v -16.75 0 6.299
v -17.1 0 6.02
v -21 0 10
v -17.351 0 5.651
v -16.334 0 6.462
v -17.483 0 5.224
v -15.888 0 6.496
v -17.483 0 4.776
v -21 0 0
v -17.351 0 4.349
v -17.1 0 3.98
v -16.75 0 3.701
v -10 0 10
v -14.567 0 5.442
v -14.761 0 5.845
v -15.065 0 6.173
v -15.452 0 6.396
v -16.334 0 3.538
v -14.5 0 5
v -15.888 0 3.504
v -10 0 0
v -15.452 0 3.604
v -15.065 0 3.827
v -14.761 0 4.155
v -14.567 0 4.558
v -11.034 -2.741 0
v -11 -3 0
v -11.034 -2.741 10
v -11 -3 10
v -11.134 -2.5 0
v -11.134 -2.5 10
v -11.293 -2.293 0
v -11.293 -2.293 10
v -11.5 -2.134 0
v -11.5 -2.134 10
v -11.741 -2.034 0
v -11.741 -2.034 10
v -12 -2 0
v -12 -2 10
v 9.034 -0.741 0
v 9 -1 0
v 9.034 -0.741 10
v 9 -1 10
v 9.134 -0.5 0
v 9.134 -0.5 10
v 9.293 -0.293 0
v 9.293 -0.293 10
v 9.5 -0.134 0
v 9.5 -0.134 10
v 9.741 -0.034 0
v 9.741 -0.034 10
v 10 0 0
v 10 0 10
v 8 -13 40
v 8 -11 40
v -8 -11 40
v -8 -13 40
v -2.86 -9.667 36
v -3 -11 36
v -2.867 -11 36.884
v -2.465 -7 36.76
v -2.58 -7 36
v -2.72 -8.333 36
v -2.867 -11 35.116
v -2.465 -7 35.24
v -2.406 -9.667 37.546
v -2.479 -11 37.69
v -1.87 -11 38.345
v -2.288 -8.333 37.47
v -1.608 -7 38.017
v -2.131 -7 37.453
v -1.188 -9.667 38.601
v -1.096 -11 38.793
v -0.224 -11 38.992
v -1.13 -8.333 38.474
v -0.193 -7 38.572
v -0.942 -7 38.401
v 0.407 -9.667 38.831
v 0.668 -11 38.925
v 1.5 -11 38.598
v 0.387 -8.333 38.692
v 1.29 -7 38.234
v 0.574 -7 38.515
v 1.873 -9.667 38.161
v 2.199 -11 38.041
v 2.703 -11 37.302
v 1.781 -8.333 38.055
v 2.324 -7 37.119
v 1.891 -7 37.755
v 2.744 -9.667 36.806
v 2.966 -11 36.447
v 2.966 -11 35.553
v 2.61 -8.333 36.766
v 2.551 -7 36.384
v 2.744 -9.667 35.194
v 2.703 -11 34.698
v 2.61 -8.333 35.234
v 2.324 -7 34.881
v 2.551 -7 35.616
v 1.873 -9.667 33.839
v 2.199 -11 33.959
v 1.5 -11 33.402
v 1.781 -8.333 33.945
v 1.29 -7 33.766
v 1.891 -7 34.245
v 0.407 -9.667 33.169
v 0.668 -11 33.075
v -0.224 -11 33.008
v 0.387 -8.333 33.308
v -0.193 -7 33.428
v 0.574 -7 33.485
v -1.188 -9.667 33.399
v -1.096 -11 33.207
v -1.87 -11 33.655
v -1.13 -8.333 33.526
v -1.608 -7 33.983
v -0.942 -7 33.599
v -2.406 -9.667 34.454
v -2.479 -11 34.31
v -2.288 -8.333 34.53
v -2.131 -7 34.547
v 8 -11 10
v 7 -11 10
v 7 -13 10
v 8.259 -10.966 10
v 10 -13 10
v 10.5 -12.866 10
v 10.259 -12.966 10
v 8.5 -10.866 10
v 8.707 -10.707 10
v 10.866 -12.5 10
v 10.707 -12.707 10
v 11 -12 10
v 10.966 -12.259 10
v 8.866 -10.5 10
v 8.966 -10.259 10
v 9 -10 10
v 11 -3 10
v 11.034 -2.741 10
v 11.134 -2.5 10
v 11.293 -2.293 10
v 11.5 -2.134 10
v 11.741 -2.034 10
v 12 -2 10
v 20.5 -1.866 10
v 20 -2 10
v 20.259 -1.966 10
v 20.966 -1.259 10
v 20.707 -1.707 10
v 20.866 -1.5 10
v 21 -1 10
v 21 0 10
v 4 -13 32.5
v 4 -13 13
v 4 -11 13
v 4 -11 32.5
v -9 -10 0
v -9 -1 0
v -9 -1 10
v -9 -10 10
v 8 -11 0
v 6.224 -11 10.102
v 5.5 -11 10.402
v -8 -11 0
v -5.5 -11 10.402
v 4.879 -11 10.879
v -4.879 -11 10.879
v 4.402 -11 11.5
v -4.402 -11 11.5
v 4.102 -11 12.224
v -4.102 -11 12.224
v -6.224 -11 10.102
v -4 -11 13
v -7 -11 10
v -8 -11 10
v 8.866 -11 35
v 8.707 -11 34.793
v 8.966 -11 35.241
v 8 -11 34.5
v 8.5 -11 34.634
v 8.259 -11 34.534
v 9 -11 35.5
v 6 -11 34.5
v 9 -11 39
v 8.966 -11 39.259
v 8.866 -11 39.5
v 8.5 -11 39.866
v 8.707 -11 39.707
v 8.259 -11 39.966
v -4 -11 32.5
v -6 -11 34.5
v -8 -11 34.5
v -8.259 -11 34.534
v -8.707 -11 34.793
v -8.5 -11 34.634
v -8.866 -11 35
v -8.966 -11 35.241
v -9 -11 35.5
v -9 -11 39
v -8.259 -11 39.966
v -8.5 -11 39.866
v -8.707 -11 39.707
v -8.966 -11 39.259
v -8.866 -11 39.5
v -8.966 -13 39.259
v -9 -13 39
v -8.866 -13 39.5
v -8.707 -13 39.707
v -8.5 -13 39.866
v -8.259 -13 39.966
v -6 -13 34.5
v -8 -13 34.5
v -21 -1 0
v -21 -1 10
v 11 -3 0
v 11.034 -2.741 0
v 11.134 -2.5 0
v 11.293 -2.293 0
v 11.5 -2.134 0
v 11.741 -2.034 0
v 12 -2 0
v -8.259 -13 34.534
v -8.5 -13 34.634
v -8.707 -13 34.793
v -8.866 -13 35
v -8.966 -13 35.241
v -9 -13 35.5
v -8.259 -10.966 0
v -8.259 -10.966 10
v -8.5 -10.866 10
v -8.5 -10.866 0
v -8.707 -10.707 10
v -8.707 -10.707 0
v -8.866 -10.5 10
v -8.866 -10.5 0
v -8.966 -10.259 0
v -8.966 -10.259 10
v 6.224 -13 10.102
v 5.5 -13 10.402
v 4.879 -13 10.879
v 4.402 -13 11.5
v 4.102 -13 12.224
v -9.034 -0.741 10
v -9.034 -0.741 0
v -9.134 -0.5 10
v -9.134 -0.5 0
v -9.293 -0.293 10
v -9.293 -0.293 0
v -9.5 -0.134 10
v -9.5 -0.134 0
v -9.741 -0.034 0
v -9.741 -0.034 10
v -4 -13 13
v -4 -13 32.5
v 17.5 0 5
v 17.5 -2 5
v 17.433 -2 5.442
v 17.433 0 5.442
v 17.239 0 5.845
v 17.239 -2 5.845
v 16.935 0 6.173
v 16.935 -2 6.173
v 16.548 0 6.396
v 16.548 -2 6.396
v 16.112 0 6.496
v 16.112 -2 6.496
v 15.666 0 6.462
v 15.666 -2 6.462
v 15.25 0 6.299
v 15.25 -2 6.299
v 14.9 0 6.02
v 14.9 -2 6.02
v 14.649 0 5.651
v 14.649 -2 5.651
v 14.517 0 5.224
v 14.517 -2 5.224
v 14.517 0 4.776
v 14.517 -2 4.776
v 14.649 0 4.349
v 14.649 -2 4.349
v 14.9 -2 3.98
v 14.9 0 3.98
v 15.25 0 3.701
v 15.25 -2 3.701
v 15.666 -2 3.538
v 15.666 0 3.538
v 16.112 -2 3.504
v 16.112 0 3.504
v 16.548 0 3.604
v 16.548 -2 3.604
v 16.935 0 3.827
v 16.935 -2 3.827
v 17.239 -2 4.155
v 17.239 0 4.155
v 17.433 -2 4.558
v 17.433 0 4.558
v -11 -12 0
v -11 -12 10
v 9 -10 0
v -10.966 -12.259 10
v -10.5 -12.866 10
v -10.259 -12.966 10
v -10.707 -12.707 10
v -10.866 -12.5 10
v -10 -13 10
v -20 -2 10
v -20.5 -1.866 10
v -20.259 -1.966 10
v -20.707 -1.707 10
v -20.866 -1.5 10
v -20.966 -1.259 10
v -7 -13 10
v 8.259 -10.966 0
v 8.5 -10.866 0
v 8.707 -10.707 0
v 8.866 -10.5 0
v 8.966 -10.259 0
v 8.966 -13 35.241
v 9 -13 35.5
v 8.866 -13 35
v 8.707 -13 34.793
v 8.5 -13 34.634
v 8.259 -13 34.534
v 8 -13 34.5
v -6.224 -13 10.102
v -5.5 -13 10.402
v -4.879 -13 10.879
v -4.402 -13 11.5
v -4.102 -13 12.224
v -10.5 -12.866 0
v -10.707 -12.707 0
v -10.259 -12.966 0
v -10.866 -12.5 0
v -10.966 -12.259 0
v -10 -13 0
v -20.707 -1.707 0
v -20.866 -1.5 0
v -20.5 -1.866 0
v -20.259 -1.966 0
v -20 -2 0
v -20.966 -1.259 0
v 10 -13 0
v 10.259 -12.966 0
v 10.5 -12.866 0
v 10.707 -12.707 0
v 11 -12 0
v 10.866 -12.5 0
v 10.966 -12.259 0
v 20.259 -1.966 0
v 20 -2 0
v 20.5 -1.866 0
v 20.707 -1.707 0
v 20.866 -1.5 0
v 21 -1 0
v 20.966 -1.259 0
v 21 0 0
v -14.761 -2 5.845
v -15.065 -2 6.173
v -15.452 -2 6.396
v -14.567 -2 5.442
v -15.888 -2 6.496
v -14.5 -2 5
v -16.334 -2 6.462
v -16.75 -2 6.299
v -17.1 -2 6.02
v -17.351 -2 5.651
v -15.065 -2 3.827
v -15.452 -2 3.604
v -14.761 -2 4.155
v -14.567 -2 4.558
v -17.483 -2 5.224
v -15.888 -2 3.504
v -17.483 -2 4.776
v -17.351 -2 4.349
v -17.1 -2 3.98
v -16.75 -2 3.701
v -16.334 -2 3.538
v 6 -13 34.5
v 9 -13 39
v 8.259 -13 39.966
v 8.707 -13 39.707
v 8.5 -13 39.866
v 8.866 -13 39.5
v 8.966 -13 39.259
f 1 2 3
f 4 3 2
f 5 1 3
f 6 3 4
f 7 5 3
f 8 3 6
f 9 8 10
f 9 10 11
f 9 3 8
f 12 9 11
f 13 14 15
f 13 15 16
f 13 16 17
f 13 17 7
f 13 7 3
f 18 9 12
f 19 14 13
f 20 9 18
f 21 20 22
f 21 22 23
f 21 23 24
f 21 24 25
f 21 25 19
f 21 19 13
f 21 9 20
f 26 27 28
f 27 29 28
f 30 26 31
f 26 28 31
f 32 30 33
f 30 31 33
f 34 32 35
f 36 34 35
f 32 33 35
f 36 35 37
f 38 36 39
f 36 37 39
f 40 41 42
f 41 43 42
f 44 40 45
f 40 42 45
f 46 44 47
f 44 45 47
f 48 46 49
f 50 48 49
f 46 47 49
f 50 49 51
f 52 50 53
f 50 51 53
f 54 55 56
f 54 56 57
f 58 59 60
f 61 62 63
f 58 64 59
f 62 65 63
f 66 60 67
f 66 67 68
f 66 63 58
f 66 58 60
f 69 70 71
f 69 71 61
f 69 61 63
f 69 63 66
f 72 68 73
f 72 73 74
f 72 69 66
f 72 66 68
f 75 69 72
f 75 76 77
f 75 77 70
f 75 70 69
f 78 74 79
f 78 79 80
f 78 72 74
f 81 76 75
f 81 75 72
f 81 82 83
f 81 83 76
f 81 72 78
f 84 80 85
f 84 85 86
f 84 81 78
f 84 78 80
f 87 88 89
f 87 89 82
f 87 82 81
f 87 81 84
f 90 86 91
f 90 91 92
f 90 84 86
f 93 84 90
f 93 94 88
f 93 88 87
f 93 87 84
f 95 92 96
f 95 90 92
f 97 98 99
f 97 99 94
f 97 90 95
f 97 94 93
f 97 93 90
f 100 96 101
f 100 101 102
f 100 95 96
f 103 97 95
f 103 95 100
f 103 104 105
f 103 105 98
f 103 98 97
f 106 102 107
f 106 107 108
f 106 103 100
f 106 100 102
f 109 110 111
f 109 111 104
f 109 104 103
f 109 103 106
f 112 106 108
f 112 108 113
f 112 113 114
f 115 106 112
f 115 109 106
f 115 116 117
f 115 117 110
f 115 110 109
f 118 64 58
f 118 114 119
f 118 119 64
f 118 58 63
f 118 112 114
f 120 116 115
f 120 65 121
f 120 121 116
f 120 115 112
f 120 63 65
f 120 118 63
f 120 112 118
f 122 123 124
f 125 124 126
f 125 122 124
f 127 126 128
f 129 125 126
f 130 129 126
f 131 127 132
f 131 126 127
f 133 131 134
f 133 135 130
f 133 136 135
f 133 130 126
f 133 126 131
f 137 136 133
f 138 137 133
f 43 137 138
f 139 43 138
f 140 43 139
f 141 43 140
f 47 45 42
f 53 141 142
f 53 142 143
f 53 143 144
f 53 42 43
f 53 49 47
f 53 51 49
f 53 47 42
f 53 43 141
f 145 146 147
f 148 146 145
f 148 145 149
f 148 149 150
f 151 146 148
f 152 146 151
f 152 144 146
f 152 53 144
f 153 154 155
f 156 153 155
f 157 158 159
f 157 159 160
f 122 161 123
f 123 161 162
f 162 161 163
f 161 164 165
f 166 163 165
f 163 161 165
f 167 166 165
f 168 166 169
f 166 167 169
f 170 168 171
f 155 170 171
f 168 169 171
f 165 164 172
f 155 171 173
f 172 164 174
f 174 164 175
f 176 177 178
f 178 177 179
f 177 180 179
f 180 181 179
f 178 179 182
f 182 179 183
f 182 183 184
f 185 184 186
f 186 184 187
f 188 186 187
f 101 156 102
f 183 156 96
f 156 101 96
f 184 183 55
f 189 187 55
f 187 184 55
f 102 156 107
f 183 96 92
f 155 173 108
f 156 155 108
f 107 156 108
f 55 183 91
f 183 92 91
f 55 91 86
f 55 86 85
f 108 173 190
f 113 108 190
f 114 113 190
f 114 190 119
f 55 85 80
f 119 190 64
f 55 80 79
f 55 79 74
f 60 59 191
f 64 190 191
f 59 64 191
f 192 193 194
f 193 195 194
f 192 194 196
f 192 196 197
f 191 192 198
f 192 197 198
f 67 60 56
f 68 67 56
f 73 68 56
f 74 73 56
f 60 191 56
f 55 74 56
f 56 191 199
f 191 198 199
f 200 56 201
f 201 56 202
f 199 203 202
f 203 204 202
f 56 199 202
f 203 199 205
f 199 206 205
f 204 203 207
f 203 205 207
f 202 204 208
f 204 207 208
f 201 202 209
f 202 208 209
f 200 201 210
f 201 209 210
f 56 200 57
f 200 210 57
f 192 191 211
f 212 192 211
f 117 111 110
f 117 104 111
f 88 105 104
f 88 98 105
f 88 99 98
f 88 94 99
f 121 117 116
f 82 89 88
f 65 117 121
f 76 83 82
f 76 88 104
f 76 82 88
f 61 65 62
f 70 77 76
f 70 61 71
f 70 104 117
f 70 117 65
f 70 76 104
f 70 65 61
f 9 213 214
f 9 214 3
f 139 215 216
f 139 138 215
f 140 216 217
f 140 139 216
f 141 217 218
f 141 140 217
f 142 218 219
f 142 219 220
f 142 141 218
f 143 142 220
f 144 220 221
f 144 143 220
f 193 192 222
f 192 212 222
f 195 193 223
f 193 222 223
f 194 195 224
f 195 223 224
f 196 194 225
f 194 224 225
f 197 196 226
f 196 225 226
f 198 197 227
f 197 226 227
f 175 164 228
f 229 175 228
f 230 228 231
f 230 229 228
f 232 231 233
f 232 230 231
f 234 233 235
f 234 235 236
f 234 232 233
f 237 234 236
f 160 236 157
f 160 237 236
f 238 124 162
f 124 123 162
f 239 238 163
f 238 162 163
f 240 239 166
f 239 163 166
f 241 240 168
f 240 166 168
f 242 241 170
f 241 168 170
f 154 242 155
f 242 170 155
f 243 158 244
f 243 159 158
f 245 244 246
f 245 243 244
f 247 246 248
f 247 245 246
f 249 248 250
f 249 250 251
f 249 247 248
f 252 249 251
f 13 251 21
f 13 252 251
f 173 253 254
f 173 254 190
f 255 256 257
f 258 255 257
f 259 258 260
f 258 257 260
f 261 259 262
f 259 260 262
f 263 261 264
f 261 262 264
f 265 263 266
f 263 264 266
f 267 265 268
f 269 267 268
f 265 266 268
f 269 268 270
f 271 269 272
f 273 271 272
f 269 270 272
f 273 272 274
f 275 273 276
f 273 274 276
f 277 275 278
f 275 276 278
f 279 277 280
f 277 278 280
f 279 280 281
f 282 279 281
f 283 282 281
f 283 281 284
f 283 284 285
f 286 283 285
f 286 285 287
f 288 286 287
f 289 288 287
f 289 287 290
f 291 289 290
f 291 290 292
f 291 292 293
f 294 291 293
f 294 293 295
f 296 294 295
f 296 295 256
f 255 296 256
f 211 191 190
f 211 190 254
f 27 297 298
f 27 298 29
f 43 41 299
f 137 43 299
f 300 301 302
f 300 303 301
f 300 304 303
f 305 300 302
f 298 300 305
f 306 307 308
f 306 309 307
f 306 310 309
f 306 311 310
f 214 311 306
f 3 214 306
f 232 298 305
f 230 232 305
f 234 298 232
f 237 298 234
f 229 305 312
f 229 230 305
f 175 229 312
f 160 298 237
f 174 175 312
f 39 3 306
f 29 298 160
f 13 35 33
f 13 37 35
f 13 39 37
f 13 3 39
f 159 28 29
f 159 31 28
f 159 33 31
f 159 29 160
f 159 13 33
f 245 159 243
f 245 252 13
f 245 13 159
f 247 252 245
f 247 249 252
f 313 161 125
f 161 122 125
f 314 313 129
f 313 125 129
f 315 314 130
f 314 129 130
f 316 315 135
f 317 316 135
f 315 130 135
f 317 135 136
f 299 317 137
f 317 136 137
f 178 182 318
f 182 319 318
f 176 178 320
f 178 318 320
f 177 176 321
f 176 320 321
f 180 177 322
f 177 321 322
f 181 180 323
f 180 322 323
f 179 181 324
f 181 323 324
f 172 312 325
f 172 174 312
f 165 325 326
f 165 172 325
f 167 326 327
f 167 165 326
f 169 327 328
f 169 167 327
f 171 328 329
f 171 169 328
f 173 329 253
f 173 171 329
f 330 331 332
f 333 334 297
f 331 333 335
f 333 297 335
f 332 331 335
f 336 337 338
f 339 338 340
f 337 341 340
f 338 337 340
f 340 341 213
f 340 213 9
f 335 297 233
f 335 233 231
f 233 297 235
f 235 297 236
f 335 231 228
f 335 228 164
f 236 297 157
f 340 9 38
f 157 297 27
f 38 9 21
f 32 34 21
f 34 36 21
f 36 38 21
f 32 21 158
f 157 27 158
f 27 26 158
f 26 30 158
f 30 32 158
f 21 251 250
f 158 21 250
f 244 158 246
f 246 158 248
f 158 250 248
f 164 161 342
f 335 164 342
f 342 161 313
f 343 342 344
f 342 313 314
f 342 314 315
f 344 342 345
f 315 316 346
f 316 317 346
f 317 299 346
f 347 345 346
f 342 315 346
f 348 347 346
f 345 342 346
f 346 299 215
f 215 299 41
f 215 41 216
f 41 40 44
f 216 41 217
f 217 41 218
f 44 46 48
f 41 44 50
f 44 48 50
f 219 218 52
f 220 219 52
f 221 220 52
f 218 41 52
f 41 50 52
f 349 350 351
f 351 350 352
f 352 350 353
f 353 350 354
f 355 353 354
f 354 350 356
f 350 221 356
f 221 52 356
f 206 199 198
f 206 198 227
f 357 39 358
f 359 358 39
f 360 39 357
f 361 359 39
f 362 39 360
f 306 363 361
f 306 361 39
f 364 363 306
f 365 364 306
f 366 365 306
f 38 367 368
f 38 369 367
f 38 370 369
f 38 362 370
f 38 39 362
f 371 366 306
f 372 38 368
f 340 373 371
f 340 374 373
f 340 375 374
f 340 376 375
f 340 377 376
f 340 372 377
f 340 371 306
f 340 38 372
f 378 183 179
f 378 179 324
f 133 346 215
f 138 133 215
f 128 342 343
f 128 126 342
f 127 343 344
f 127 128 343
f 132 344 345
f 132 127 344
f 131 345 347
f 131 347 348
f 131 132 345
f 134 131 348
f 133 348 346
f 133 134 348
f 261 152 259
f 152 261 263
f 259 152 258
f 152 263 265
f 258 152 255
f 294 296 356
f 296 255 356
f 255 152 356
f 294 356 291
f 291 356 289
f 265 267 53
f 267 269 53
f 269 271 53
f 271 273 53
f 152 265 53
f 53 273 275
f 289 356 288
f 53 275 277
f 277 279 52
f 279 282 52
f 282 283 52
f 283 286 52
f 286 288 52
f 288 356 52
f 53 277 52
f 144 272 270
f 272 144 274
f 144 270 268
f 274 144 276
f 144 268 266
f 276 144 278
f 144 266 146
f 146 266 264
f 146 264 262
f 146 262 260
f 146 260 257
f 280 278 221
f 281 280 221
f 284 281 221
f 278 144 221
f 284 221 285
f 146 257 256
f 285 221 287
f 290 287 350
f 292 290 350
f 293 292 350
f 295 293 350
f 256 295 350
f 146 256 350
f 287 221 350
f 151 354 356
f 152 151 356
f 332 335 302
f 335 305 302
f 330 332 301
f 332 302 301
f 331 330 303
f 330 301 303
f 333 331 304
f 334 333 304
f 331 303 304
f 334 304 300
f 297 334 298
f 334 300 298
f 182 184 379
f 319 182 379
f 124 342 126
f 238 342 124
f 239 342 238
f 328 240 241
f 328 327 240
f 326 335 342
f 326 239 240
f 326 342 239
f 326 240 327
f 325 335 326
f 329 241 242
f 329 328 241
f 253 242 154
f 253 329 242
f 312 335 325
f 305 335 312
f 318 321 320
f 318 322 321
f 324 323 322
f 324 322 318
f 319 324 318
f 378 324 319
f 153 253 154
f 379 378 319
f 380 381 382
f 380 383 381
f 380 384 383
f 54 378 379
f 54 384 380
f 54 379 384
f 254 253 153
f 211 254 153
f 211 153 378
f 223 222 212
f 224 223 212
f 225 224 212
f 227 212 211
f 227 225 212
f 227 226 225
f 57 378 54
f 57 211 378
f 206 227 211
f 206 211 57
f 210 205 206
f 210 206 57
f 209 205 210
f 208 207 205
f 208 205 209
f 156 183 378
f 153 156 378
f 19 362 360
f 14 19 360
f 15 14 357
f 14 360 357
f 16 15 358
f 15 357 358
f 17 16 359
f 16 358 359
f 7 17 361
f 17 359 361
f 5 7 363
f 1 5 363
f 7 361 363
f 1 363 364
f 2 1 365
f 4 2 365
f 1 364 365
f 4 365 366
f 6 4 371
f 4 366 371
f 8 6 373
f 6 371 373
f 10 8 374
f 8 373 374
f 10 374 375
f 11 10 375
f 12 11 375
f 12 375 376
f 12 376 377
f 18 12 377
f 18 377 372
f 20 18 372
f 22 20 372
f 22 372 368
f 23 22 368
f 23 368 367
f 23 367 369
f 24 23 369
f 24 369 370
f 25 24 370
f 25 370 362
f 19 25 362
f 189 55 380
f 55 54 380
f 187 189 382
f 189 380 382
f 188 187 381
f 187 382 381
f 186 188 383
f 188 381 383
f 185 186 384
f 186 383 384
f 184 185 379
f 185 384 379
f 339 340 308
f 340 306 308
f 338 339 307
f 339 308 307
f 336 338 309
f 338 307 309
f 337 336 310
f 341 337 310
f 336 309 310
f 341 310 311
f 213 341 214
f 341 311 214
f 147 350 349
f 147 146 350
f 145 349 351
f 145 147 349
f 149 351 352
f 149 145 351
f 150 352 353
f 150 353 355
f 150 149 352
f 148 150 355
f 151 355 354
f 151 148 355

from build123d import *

# Parameters (mm, degrees)
PAD_DEPTH    = 10
SKETCH001_W  = 8
SKETCH001_H  = 2
PAD001_DEPTH = 30
SKETCH002_R  = 3
PAD002_DEPTH = 4
PAD002_TAPER = 6
SKETCH004_W  = 2
SKETCH004_H  = 5.5
PAD003_DEPTH = 5
SKETCH005_R  = 1.5
HOLE_DEPTH   = 2.001
FILLET_R     = 1
FILLET001_R  = 3
CHAMFER_SIZE = 2
FILLET002_R  = 1


with BuildPart() as part:
    # Sketch → Pad (new body)
    with BuildSketch(Plane.XY):
        Polygon((-21, 0), (-9, 0), (-9, -11), (0, -11), (0, -13), (-11, -13), (-11, -2), (-21, -2), align=None)
    pad = extrude(amount=PAD_DEPTH)

    # Mirrored: Pad across Sketch V_Axis
    add(pad.mirror(Plane(origin=(0, 0, 0), x_dir=(0, 0, 1), z_dir=(1, 0, 0))))

    # Sketch001 (on Face11 of Mirrored) → Pad001 (join)
    with BuildSketch(Plane.XY.offset(10)):
        with Locations((0, -12)):
            Rectangle(SKETCH001_W, SKETCH001_H)
    extrude(amount=PAD001_DEPTH)

    # Sketch002 (on Face13 of Pad001) → Pad002 (join)
    with BuildSketch(Plane(origin=(0, -11, 0), x_dir=(-1, 0, 0), z_dir=(0, 1, 0))):
        with Locations((0, 36)):
            Circle(SKETCH002_R)
    extrude(amount=PAD002_DEPTH, taper=PAD002_TAPER)

    # Sketch004 (on Face11 of Pad002) → Pad003 (join)
    with BuildSketch(Plane(origin=(-4, 0, 0), x_dir=(0, -1, 0), z_dir=(-1, 0, 0))):
        with Locations((12, 37.25)):
            Rectangle(SKETCH004_W, SKETCH004_H)
    pad003 = extrude(amount=PAD003_DEPTH)

    # Mirrored001: Pad003 across YZ
    add(pad003.mirror(Plane.YZ))

    # Sketch005 (on Face6 of Mirrored001) → Hole (cut, through all)
    with BuildSketch(Plane.XZ.offset(2)):
        with Locations((-16, 5)):
            Circle(SKETCH005_R)
        with Locations((16, 5)):
            Circle(SKETCH005_R)
    extrude(amount=-HOLE_DEPTH, mode=Mode.SUBTRACT)

    # Fillet
    fillet_edges = [part.edges().sort_by_distance(p)[0] for p in [
        (-21, -2, 5),
        (-11, -2, 5),
        (-11, -13, 5),
        (11, -13, 5),
        (21, -2, 5),
        (11, -2, 5),
        (9, -11, 5),
        (9, 0, 5),
        (-9, 0, 5),
        (-9, -11, 5),
    ]]
    fillet(fillet_edges, radius=FILLET_R)

    # Fillet001
    fillet001_edges = [part.edges().sort_by_distance(p)[0] for p in [
        (-4, -12, 10),
        (4, -12, 10),
    ]]
    fillet(fillet001_edges, radius=FILLET001_R)

    # Chamfer
    chamfer_edges = [part.edges().sort_by_distance(p)[0] for p in [
        (4, -12, 34.5),
        (-4, -12, 34.5),
    ]]
    chamfer(chamfer_edges, length=CHAMFER_SIZE)

    # Fillet002
    fillet002_edges = [part.edges().sort_by_distance(p)[0] for p in [
        (-9, -12, 34.5),
        (-9, -12, 40),
        (9, -12, 34.5),
        (9, -12, 40),
    ]]
    fillet(fillet002_edges, radius=FILLET002_R)


solid = part.part
